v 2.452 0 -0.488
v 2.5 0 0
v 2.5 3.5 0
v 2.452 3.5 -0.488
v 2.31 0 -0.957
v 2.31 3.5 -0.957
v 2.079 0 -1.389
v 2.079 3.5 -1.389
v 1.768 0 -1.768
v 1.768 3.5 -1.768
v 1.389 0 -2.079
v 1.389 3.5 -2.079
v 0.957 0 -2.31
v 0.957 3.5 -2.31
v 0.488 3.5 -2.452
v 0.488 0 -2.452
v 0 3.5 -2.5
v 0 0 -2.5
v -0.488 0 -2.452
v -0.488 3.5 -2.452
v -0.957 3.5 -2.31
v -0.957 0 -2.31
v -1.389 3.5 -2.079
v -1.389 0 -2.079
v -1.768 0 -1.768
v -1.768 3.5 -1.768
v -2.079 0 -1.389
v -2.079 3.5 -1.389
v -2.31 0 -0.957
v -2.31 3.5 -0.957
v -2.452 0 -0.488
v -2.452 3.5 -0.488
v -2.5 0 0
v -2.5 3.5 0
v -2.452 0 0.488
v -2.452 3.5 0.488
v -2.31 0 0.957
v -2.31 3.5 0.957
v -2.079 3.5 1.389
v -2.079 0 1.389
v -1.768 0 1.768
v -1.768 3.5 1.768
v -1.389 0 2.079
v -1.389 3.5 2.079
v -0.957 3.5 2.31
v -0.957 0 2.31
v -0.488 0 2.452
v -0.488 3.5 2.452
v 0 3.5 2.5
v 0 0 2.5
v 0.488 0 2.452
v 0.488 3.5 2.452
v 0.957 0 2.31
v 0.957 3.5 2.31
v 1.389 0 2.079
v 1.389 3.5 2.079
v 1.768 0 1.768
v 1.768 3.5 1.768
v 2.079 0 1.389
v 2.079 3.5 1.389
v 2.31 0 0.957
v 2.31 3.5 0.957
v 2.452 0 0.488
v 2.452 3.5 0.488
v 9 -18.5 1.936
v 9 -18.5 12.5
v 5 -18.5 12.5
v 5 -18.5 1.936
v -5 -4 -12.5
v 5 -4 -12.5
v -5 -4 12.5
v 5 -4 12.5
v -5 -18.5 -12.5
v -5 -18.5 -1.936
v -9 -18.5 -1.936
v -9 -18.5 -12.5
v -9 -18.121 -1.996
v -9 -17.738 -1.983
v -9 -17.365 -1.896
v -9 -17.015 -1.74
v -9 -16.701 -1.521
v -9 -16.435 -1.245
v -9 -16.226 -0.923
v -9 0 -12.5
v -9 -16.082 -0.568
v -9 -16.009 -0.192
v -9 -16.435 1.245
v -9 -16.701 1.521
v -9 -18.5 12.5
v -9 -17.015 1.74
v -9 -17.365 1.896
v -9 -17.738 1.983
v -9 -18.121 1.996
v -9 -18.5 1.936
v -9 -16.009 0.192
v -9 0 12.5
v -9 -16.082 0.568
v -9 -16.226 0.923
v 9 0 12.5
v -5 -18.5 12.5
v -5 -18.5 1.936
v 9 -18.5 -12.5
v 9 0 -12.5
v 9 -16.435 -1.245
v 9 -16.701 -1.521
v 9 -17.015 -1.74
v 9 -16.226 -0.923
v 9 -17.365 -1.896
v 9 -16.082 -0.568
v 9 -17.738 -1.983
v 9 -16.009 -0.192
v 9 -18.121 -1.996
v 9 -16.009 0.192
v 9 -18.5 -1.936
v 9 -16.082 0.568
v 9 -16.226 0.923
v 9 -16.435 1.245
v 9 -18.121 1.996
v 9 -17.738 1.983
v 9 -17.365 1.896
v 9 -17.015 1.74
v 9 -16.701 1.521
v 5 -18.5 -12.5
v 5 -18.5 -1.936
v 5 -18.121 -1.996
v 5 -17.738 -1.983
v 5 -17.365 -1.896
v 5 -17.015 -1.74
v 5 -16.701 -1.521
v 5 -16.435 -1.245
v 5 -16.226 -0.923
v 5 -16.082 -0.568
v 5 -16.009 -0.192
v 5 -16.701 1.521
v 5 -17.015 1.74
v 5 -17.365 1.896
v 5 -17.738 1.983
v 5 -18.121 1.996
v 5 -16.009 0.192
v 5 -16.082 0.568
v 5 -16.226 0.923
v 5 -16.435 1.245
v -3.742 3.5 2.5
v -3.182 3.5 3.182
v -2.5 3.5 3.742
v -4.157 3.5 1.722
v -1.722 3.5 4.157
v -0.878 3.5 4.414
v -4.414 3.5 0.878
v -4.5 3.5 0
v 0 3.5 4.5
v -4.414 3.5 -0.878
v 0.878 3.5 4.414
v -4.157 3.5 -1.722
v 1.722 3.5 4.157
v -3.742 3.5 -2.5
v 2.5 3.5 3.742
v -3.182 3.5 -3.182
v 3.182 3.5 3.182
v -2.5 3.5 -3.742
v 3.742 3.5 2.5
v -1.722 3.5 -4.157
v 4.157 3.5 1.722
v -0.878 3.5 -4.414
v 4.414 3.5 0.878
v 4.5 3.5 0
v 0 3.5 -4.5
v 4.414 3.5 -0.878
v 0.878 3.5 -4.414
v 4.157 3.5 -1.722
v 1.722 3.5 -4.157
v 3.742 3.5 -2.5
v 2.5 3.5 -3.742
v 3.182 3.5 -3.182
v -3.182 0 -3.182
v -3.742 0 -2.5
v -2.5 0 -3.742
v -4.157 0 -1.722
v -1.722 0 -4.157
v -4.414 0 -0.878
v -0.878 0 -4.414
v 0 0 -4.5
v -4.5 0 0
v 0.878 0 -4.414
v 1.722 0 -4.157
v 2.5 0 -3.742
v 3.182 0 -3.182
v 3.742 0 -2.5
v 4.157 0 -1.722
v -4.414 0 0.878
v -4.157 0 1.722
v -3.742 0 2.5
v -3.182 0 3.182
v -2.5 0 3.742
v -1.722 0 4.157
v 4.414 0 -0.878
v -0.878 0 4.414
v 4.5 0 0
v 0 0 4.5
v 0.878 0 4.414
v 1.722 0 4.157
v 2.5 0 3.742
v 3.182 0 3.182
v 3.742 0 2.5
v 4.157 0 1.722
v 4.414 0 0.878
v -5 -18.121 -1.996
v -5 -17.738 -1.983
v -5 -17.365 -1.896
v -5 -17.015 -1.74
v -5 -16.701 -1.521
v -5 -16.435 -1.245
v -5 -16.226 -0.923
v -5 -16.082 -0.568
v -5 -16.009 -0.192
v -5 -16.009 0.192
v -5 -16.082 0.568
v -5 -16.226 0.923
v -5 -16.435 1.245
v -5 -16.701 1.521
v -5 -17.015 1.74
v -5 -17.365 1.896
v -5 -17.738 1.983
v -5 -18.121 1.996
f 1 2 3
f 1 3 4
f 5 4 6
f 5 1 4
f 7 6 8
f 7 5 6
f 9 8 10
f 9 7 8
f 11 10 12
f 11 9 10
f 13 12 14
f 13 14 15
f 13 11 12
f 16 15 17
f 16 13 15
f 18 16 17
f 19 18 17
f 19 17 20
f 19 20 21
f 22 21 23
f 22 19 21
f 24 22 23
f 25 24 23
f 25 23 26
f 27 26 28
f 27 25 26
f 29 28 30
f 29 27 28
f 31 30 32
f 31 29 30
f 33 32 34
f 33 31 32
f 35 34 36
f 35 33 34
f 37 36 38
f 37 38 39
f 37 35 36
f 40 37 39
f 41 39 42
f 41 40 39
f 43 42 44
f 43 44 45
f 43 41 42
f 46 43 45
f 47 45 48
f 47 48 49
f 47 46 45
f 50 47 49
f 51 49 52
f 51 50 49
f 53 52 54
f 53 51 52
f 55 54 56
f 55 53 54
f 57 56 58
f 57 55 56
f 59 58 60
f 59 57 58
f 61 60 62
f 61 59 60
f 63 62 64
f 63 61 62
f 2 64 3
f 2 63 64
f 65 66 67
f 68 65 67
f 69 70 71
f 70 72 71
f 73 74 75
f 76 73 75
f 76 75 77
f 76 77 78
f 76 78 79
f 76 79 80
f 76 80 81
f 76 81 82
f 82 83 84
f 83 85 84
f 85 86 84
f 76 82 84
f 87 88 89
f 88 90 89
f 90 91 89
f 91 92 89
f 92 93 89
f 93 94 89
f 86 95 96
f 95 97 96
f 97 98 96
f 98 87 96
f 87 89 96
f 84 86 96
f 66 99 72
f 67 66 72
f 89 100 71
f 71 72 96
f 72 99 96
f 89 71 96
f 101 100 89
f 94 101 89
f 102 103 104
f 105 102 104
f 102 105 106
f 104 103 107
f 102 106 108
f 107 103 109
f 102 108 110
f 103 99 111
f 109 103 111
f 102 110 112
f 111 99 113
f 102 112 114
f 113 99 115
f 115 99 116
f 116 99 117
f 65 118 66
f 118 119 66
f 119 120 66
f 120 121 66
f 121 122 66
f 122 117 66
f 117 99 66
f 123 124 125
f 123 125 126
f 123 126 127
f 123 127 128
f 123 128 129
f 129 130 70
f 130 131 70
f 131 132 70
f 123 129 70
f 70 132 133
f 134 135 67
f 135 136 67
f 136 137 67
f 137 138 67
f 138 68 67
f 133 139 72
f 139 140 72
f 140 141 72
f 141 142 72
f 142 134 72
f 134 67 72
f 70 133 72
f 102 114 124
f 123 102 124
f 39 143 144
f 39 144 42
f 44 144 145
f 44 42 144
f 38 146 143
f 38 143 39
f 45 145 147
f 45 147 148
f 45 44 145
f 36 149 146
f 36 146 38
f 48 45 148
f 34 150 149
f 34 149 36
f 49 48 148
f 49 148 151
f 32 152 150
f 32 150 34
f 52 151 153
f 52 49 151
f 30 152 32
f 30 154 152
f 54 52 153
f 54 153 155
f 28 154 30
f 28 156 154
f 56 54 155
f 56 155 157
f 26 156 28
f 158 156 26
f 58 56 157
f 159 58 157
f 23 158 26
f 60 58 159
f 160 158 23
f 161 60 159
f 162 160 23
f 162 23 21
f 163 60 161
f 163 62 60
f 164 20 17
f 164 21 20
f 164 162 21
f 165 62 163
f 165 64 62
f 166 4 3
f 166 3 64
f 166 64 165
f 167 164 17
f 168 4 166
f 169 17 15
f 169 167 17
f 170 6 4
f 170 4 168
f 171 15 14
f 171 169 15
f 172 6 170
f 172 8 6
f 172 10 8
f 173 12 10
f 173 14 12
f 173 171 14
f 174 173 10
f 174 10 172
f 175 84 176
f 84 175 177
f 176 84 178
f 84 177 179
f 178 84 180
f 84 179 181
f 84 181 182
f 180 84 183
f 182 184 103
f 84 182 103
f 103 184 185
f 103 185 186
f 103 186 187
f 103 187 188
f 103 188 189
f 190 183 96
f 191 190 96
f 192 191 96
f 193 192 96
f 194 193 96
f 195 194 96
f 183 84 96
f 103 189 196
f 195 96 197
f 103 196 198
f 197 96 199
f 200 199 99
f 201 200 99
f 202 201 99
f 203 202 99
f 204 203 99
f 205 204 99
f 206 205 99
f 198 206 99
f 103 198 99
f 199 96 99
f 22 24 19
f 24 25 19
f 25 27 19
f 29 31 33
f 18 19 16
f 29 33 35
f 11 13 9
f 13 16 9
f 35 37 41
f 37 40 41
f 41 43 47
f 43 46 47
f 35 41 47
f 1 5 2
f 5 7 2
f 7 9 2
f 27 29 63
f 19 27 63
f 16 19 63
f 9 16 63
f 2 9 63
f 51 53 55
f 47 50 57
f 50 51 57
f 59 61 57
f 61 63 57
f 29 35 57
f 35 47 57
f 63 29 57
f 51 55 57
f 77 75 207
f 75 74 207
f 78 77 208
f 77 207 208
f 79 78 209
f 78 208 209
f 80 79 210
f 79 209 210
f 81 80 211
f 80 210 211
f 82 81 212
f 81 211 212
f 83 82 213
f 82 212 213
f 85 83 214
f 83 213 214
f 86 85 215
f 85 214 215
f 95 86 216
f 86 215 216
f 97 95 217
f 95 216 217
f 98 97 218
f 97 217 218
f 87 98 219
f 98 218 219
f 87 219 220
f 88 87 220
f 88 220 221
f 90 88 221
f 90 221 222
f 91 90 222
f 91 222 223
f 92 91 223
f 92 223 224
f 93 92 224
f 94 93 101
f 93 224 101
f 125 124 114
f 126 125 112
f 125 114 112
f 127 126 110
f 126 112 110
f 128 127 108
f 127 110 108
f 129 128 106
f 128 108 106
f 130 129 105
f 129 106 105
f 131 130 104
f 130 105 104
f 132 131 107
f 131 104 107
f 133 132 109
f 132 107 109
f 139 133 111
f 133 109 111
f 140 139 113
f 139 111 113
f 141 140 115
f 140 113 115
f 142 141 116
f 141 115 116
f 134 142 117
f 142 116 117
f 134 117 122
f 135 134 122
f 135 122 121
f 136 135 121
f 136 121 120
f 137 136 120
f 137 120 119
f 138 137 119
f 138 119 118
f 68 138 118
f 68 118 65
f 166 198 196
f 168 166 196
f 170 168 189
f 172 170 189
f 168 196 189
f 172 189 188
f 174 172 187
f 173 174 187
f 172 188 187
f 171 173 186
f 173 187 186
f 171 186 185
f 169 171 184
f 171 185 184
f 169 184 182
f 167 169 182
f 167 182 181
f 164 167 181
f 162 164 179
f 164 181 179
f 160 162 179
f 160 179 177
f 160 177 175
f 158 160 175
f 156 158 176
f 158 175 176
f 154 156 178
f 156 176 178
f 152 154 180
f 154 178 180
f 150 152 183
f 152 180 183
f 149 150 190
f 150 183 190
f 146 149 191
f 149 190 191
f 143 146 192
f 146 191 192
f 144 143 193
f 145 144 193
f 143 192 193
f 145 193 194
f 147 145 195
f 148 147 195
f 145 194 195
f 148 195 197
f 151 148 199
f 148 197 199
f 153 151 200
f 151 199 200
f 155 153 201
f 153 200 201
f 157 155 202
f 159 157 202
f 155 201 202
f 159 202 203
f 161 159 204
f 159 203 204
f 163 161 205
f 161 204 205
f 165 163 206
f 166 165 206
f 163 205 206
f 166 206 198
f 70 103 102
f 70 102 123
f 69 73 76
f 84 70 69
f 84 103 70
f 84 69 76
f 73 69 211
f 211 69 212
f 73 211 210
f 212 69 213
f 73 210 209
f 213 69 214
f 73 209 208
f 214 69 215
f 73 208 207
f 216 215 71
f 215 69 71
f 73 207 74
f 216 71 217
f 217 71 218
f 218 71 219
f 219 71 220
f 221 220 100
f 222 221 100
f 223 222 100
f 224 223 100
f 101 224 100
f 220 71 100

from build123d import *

# Parameters (mm, degrees)
BOSS_EXTRUDE1_DEPTH = 12.5
SKETCH2_R           = 4.5
SKETCH2_R_2         = 2.5
EXTRUDE_THIN1_DEPTH = 3.5
CUT_EXTRUDE1_REACH  = 30.679
SKETCH3_R           = 2


with BuildPart() as part:
    # Sketch1 → Boss-Extrude1 (new, symmetric)
    with BuildSketch(Plane.XY):
        Polygon((-9, 0), (9, 0), (9, -18.5), (5, -18.5), (5, -4), (-5, -4), (-5, -18.5), (-9, -18.5), align=None)
    extrude(amount=BOSS_EXTRUDE1_DEPTH, both=True)

    # Sketch2 → Extrude-Thin1 (add)
    with BuildSketch(Plane(origin=(0, 0, 0), x_dir=(1, 0, 0), z_dir=(0, 1, 0))):
        Circle(SKETCH2_R)
        Circle(SKETCH2_R_2, mode=Mode.SUBTRACT)
    extrude(amount=EXTRUDE_THIN1_DEPTH)

    # Cut-Extrude1: up to this face of the body (flat: up to its plane)
    cut_extrude1_end = Plane(part.part.faces().sort_by_distance((-9, -9.25, 0))[0])
    # Sketch3 → Cut-Extrude1 (cut, up to the picked face)
    with BuildSketch(Plane(origin=(9, 0, 0), x_dir=(0, 0, -1), z_dir=(1, 0, 0)), mode=Mode.PRIVATE) as cut_extrude1_sk1:
        with Locations((0, -18)):
            Circle(SKETCH3_R)
    cut_extrude1_tool1 = split(extrude(cut_extrude1_sk1.sketch, amount=-CUT_EXTRUDE1_REACH, mode=Mode.PRIVATE), bisect_by=cut_extrude1_end, keep=Keep.BOTH, mode=Mode.PRIVATE)
    add(cut_extrude1_tool1.solids().sort_by(Axis((9, -18, 0), (-1, 0, 0)))[0], mode=Mode.SUBTRACT)


solid = part.part
